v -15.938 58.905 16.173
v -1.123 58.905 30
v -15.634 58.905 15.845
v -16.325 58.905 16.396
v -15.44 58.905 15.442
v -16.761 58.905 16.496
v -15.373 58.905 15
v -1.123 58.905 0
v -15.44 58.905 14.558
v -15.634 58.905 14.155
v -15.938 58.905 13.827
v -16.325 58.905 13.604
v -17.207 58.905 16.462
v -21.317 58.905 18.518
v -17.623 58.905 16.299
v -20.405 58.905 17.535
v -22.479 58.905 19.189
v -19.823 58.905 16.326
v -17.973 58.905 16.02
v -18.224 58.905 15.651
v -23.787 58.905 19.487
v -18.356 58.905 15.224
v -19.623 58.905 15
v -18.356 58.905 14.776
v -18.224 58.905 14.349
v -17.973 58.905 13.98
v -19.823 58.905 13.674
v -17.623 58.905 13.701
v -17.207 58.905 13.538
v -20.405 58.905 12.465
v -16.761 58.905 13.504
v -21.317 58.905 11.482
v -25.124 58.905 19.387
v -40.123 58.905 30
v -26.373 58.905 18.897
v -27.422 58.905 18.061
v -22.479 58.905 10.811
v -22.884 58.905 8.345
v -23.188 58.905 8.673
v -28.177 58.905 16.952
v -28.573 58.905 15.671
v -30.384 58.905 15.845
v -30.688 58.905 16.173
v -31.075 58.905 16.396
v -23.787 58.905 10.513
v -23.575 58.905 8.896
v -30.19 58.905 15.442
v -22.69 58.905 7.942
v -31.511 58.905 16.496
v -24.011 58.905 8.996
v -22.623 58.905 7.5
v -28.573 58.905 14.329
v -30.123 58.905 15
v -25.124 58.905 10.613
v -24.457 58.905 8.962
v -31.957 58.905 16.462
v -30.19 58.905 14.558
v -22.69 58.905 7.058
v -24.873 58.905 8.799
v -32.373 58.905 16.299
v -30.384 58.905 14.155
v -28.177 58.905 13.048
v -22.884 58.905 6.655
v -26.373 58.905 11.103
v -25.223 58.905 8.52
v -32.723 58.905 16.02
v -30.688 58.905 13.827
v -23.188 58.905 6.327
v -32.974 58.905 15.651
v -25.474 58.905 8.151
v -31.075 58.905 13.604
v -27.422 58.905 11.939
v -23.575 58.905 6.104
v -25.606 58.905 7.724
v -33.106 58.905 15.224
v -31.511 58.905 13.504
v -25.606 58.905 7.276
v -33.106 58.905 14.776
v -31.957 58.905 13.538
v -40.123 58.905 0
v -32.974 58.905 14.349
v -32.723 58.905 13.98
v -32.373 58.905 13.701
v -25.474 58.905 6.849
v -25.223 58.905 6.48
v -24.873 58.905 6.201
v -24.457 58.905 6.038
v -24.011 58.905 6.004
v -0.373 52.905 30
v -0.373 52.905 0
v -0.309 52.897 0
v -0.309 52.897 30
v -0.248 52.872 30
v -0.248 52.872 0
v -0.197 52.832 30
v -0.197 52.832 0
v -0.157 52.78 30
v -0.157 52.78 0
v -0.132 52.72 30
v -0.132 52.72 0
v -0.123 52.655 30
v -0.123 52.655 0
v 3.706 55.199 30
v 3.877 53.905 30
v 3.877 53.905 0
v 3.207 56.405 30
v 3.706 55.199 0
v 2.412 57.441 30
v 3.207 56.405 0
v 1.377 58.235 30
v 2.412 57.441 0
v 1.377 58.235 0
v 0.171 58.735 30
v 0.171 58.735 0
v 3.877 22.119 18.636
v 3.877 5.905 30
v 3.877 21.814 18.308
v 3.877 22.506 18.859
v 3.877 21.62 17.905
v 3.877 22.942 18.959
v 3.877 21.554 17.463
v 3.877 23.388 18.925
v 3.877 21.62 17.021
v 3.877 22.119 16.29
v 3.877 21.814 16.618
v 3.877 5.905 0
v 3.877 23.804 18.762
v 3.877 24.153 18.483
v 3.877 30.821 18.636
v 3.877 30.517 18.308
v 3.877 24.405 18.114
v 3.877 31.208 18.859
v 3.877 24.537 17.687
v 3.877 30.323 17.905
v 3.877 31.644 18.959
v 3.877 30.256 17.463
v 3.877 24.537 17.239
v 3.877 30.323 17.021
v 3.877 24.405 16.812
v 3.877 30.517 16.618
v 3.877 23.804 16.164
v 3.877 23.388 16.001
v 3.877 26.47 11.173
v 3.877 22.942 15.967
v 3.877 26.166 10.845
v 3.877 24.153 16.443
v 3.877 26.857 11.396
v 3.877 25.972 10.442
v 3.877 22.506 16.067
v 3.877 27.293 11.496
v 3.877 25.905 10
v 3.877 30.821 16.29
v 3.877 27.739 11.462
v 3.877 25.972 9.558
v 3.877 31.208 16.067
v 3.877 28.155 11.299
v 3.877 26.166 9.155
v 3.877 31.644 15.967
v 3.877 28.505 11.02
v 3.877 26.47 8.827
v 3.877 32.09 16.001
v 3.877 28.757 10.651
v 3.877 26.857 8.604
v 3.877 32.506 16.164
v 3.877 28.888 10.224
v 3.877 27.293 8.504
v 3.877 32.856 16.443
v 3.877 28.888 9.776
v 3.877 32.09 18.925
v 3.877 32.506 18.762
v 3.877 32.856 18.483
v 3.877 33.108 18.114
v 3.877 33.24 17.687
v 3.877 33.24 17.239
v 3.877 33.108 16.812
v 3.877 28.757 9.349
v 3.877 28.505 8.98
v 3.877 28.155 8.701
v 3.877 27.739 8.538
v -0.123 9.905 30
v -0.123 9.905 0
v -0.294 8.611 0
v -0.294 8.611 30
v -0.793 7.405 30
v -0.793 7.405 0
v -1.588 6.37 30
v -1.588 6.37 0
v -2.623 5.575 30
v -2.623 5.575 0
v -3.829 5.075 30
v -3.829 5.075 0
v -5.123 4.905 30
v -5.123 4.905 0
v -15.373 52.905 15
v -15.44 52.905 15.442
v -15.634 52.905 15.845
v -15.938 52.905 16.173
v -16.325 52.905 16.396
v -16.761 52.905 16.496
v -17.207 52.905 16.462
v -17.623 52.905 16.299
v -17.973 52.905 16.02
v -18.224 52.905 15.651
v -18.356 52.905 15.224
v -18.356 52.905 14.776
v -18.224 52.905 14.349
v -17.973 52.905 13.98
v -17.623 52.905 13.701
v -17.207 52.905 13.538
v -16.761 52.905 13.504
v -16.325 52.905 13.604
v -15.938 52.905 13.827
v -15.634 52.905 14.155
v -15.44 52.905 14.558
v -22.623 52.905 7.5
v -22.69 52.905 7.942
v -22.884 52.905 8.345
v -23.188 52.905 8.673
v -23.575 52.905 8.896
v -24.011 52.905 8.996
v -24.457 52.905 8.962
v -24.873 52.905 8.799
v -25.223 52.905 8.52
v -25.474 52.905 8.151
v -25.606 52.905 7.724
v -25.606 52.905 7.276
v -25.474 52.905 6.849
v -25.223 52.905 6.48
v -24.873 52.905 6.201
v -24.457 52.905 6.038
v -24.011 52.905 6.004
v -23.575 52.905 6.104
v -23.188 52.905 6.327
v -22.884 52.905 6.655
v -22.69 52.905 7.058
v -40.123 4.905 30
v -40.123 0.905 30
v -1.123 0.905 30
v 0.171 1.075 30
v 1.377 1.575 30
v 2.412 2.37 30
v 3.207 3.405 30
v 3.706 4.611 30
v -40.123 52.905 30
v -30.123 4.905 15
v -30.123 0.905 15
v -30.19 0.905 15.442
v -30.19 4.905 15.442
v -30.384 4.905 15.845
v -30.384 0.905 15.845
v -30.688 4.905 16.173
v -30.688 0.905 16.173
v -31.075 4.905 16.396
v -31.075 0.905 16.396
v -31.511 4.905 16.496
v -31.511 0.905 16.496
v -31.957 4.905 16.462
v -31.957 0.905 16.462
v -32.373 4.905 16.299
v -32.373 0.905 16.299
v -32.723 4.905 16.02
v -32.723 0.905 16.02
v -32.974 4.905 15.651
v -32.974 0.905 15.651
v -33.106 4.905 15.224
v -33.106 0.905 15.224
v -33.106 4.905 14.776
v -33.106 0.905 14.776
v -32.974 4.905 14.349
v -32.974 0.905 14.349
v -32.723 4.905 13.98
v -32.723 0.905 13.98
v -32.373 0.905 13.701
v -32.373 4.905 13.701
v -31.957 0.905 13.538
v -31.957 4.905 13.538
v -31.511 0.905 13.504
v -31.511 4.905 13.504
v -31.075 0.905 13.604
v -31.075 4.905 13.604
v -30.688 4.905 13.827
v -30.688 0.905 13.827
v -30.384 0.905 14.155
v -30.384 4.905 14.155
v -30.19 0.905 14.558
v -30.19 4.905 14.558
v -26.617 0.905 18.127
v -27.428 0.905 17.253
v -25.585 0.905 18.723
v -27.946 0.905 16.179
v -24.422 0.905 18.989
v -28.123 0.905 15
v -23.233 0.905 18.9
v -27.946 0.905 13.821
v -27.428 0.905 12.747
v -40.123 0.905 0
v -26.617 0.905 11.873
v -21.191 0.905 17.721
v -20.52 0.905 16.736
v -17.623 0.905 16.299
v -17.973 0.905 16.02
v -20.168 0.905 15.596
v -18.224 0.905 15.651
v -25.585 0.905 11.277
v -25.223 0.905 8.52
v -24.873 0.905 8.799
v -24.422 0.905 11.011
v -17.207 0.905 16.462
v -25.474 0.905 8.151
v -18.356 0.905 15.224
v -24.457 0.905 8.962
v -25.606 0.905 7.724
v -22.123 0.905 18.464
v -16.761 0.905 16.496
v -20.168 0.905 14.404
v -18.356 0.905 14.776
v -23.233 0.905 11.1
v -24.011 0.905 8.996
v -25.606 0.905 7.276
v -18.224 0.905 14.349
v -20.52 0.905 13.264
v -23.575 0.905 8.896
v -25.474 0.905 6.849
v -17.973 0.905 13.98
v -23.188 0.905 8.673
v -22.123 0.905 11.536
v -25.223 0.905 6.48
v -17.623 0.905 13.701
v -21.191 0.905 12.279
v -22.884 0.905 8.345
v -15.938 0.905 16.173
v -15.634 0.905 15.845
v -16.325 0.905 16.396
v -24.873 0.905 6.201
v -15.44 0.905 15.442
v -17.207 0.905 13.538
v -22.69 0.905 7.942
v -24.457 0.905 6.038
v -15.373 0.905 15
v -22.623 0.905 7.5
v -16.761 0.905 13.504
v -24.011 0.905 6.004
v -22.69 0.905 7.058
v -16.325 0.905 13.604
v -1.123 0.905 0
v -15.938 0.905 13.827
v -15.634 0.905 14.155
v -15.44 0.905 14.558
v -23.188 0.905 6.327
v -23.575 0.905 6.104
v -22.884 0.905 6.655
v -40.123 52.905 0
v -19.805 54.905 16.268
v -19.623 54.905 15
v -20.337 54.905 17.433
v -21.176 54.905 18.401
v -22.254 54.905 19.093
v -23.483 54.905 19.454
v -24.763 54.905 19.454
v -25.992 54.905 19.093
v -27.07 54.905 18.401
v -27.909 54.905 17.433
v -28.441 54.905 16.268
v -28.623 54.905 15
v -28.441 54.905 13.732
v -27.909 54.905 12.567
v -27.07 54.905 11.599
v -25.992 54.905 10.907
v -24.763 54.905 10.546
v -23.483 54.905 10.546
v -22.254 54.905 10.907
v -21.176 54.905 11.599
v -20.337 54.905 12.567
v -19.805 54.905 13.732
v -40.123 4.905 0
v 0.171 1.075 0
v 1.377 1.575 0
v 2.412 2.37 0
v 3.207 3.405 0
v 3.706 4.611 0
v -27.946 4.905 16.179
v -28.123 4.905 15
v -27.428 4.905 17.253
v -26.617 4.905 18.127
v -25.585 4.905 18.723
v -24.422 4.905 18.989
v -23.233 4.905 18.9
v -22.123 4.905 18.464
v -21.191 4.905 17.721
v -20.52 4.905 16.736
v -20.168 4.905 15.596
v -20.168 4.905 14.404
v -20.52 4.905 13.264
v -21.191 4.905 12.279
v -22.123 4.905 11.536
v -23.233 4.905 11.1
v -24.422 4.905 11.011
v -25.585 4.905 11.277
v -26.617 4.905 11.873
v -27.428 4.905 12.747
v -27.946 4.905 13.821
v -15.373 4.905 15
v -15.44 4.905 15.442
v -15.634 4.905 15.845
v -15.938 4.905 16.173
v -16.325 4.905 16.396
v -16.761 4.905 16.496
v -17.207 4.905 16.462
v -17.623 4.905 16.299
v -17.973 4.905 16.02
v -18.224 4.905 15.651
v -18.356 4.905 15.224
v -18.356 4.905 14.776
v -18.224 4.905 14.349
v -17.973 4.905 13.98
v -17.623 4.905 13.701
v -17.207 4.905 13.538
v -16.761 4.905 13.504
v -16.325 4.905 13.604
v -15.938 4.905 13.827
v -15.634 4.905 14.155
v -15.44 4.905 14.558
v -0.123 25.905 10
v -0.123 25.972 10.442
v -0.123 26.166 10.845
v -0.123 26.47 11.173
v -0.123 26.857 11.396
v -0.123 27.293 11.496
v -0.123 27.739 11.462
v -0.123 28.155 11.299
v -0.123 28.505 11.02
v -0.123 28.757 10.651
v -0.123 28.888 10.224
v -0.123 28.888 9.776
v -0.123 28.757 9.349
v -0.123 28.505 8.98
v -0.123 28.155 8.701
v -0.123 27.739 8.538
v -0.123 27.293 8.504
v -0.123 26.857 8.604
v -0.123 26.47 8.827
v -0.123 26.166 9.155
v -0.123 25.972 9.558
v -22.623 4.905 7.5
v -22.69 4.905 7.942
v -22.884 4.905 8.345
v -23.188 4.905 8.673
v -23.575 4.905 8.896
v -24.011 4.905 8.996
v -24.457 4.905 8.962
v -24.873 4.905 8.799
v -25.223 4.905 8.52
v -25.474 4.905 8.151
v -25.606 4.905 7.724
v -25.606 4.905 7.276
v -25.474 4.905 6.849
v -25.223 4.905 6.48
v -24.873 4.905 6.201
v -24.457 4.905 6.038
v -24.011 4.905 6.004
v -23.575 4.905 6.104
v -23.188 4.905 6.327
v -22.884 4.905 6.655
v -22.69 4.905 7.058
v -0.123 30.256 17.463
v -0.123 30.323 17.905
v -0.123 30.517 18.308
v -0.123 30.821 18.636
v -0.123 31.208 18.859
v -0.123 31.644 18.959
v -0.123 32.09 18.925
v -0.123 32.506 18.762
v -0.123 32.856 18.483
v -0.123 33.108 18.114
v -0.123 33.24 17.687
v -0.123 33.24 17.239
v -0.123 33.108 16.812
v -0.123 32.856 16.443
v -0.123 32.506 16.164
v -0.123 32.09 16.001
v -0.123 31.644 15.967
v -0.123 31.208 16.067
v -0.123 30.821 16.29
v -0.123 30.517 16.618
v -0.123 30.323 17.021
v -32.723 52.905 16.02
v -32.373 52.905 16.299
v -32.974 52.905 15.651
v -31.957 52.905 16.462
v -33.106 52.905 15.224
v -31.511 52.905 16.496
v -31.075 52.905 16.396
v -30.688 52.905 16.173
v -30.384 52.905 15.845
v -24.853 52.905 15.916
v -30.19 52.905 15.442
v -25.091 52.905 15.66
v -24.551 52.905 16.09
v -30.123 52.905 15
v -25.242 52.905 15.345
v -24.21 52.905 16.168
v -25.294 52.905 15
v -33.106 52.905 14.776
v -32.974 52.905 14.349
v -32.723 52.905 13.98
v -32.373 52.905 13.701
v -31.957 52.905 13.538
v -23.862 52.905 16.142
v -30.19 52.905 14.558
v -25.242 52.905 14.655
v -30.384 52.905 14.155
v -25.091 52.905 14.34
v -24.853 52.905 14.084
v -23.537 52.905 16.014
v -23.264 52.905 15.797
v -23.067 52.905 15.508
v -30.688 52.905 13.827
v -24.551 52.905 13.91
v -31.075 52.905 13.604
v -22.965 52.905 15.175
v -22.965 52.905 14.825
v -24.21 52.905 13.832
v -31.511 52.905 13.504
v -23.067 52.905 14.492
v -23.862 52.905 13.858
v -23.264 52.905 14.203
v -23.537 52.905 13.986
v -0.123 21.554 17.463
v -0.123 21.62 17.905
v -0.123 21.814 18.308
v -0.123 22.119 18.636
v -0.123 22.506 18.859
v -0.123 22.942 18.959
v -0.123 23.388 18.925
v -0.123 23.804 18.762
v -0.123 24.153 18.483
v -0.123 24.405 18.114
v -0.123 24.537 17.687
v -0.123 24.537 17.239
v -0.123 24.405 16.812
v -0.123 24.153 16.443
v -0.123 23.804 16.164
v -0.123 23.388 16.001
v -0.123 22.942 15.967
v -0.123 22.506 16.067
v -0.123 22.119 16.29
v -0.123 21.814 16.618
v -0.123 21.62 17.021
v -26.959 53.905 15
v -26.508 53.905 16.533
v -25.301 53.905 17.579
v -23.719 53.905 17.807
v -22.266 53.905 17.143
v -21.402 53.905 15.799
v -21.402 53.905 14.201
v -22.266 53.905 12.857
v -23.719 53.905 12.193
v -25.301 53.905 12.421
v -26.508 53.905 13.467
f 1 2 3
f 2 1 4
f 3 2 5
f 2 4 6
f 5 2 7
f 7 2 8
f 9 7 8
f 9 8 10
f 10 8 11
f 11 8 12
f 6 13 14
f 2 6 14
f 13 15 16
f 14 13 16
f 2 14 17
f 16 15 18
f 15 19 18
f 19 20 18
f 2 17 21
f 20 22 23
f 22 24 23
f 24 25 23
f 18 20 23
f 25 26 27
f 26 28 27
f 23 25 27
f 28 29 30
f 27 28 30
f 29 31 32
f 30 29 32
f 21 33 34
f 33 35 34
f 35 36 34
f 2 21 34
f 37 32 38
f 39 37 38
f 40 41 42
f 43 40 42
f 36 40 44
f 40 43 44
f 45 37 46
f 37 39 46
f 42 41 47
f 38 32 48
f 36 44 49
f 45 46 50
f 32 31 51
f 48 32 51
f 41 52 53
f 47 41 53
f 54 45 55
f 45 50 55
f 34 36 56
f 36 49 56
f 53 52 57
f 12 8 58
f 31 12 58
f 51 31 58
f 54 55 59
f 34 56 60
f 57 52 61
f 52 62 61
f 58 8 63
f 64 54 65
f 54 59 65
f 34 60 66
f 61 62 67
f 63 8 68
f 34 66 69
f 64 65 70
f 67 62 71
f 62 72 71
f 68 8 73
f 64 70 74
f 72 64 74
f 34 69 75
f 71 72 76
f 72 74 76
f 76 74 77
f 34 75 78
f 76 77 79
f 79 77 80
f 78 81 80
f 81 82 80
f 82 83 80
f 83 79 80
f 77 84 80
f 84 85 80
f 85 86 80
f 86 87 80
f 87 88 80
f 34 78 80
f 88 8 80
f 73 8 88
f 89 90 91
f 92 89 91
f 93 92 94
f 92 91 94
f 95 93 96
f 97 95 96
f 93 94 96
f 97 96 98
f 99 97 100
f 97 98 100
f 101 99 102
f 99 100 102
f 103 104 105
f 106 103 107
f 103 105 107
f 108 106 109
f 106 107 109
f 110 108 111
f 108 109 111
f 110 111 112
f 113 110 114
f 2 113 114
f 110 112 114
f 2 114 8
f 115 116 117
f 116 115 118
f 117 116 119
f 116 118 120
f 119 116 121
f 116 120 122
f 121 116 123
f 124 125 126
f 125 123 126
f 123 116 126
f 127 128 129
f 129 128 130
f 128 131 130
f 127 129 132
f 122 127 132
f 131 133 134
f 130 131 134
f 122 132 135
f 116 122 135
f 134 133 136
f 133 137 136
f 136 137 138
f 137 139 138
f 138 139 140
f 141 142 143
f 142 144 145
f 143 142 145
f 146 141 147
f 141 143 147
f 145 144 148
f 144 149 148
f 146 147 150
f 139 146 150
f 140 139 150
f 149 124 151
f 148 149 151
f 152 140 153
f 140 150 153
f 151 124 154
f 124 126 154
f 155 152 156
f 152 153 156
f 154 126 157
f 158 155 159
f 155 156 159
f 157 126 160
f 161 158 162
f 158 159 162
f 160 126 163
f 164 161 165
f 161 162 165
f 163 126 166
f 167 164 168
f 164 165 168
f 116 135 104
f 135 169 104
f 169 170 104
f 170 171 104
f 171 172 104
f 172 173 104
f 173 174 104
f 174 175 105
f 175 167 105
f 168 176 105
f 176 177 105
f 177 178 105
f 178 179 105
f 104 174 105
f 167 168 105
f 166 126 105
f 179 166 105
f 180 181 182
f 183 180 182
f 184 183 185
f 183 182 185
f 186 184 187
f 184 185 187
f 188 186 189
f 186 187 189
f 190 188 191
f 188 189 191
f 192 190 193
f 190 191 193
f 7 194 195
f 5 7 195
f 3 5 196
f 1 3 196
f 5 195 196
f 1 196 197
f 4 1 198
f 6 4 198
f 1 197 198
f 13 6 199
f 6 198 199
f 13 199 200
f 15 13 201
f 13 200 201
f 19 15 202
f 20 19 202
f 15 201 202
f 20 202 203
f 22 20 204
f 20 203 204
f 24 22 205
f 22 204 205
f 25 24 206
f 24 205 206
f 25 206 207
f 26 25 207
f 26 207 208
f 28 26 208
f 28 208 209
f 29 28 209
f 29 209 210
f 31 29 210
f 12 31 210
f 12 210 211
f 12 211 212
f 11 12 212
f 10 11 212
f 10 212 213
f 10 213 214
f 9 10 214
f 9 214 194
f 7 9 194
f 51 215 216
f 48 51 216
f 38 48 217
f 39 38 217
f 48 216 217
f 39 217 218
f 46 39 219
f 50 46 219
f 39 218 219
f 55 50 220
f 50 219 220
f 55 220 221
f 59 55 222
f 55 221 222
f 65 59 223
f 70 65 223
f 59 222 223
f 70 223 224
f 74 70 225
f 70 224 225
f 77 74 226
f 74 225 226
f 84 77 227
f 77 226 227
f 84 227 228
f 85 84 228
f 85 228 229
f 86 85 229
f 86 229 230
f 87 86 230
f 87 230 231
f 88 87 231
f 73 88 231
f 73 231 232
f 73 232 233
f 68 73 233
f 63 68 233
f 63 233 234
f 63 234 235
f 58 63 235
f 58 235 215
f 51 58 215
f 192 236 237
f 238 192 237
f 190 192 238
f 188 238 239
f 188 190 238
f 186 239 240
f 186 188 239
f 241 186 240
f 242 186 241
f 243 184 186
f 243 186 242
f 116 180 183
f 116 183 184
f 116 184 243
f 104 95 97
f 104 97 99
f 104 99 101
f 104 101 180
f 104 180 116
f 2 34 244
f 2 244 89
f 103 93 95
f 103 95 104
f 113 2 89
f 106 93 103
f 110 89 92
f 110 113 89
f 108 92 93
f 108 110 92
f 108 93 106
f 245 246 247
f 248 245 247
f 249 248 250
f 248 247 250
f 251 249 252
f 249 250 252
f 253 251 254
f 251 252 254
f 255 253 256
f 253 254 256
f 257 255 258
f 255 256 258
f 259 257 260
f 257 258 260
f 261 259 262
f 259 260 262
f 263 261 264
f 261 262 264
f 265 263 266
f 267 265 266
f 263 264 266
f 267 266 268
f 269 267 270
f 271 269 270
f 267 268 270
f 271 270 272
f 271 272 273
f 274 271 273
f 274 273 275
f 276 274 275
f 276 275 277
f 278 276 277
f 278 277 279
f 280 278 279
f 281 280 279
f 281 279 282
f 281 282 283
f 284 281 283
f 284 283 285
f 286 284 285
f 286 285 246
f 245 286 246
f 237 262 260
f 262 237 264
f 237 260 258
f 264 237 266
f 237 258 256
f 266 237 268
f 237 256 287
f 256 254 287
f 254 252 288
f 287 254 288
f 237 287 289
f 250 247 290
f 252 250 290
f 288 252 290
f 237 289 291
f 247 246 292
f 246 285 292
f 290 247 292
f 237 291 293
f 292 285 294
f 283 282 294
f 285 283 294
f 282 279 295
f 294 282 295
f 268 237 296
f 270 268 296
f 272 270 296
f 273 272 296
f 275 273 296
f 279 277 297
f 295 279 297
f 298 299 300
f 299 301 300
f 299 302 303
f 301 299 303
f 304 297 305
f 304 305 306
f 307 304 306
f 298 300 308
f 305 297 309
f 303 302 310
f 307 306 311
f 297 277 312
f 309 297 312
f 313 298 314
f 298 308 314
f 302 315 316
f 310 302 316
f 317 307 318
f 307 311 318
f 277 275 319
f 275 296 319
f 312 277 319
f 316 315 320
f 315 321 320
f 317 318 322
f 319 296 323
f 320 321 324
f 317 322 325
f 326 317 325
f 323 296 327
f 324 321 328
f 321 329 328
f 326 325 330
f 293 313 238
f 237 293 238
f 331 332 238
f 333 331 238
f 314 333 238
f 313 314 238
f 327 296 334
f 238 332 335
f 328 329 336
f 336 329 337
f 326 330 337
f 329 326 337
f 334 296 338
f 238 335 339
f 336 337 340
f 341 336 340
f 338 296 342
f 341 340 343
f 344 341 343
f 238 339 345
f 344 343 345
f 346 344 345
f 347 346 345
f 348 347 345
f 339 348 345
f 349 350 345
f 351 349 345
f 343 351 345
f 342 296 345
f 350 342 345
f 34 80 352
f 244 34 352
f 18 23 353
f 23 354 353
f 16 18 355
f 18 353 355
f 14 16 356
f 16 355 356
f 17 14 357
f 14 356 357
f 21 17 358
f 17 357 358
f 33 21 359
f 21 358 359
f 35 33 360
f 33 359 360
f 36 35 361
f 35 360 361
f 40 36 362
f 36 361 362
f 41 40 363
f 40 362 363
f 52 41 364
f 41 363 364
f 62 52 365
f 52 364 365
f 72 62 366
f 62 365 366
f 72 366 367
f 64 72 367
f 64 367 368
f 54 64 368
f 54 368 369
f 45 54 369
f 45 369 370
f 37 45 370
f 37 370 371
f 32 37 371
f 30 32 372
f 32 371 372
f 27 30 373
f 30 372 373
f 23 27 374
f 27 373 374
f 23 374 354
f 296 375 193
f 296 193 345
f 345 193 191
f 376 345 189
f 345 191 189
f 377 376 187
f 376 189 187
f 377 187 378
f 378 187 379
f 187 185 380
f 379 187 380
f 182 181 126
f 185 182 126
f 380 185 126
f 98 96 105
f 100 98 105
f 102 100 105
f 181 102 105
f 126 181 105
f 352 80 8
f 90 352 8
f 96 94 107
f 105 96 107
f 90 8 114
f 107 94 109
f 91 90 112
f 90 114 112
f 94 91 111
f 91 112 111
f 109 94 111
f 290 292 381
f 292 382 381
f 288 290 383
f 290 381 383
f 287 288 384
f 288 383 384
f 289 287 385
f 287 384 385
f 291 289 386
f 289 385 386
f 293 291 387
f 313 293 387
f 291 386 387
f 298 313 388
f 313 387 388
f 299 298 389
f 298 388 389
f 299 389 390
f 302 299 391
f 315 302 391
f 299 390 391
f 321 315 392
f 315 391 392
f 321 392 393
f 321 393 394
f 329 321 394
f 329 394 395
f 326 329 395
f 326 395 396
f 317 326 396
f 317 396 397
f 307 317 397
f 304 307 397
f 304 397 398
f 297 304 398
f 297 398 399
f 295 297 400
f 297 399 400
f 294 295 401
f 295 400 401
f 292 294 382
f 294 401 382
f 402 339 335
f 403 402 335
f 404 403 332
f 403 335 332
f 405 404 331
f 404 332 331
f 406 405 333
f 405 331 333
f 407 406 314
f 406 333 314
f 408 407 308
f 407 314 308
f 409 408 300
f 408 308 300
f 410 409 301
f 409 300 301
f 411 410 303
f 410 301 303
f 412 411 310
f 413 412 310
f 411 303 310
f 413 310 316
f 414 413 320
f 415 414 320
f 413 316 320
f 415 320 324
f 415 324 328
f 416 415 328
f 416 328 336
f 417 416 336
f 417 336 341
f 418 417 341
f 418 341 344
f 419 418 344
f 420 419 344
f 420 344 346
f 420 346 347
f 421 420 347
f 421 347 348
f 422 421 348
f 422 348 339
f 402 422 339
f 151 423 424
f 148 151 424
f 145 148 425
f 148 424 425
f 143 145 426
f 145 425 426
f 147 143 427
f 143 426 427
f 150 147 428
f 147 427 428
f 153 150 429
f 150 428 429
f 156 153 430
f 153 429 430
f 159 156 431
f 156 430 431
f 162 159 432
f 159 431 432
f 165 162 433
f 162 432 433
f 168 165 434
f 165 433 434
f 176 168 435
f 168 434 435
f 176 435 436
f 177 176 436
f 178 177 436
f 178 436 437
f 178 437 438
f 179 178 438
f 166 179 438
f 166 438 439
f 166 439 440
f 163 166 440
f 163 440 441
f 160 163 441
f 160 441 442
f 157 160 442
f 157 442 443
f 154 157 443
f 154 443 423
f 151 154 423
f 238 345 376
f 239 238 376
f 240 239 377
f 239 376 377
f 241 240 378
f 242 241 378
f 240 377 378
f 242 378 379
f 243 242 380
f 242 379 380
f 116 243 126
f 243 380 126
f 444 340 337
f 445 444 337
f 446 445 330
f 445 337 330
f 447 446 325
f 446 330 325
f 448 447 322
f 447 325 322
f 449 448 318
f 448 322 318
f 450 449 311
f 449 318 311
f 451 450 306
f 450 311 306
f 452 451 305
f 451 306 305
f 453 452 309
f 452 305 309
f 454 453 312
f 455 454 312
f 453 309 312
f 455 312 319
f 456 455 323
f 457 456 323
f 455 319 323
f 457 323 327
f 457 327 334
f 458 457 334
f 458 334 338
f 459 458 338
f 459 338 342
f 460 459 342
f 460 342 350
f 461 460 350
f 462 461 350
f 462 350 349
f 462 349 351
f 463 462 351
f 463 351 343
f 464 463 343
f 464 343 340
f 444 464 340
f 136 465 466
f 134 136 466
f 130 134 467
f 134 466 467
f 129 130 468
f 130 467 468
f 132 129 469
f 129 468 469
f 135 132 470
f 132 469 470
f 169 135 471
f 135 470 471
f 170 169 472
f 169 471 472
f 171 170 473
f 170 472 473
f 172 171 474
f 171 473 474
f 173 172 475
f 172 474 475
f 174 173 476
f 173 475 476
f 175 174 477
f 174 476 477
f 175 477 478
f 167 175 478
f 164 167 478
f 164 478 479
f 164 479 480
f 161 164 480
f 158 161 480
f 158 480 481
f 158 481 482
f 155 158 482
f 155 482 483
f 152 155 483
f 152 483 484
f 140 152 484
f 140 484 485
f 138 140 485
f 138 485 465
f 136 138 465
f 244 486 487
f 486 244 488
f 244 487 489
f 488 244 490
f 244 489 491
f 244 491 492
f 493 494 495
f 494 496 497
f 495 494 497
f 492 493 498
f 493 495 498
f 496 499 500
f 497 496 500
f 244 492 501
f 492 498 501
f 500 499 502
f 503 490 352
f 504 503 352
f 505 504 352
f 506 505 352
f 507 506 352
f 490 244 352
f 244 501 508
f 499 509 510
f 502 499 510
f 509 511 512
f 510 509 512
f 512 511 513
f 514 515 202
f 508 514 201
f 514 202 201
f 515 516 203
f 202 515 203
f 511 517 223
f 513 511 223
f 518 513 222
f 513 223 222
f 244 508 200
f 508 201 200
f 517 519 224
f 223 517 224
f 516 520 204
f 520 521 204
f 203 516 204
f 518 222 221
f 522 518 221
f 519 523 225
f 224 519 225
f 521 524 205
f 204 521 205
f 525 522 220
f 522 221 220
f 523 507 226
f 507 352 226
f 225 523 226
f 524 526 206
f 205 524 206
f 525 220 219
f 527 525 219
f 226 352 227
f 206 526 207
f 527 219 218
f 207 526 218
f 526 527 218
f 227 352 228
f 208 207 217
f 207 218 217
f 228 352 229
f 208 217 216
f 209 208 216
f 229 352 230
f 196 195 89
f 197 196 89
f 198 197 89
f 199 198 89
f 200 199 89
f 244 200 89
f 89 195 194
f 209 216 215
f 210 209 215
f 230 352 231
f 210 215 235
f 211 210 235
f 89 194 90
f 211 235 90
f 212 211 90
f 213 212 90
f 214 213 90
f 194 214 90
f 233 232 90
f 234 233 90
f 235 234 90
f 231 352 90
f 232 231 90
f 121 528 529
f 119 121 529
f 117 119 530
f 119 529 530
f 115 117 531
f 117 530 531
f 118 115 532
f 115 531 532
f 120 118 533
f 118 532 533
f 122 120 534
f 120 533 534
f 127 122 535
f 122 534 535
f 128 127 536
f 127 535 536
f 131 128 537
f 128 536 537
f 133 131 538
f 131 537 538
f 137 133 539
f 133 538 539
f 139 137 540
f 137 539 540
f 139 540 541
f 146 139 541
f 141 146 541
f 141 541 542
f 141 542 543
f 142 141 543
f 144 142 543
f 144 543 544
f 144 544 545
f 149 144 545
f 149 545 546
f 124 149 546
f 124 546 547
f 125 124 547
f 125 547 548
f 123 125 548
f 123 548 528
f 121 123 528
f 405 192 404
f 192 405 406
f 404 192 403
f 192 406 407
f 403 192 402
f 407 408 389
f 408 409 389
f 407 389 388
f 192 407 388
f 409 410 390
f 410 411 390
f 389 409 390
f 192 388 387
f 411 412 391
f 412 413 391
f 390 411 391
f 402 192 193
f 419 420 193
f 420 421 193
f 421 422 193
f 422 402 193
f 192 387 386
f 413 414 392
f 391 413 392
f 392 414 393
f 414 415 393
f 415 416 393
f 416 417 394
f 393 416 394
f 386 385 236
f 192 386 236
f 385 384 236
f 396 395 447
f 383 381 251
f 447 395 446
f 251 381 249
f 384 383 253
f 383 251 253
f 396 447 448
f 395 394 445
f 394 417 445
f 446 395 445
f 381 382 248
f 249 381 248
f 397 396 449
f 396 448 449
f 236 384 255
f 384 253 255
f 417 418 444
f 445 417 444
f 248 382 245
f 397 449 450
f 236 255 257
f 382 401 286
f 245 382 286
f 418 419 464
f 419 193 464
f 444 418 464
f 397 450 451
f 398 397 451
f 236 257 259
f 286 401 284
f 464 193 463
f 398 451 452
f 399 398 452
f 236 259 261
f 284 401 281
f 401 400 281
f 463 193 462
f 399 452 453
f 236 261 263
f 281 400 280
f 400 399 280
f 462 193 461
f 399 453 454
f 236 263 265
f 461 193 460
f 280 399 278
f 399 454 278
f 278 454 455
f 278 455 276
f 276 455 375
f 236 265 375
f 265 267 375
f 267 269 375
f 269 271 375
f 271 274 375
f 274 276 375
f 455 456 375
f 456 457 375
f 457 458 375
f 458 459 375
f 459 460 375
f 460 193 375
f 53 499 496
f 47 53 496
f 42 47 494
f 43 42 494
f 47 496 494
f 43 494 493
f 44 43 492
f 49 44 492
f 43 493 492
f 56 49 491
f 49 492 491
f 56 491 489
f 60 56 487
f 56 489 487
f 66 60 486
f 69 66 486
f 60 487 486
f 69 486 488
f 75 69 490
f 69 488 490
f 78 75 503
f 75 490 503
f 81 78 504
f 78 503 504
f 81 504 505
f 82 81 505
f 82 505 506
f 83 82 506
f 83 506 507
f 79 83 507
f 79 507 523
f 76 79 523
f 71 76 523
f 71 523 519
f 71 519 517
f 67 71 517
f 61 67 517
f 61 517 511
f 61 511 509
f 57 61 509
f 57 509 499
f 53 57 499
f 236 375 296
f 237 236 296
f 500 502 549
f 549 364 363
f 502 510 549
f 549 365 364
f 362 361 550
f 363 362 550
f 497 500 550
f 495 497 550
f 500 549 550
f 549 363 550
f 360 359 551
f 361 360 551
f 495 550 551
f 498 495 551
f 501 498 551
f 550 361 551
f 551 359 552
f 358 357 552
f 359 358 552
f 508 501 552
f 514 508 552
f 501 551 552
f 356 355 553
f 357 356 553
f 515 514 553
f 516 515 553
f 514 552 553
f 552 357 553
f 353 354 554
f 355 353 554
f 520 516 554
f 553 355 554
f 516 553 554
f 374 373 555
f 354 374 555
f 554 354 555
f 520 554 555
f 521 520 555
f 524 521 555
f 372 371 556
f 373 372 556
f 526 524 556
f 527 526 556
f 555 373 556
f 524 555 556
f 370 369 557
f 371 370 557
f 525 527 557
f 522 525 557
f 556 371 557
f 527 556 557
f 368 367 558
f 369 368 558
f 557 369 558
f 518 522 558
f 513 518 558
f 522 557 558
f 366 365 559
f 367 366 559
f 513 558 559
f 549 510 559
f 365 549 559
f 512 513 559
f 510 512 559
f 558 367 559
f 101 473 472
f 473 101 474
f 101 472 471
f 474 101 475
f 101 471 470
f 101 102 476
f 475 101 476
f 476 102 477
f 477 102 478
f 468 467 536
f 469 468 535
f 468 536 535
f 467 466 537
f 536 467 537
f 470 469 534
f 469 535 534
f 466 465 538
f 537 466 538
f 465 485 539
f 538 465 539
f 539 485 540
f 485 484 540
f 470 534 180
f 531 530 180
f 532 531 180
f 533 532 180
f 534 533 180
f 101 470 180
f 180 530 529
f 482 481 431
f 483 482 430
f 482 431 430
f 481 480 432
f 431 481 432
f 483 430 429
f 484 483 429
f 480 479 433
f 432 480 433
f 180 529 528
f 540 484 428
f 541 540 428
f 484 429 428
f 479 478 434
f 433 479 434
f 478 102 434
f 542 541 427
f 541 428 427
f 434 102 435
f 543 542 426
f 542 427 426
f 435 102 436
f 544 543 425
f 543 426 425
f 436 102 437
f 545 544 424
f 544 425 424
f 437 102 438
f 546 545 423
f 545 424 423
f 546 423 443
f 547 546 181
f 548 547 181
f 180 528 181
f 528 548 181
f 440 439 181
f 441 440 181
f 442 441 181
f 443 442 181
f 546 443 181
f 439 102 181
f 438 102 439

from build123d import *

# Parameters (mm, degrees)
F1_DEPTH = 30
F3_D     = 3
F5_D     = 9
F5_DEPTH = 4
F5_TIP   = 2.7038727856
F7_D     = 3
F9_D     = 8
F9_DEPTH = 4
F9_TIP   = 2.4034424761


with BuildPart() as f1:
    # F0 (on Top) → F1 (new body)
    with BuildSketch(Plane.XY):
        with BuildLine():
            ThreePointArc((-0.3734174669, 52.9050653557), (-0.1966407716, 52.831842051), (-0.1234174669, 52.6550653557))
            Line((-0.1234174669, 52.6550653557), (-0.1234174669, 9.9050653557))
            ThreePointArc((-0.1234174669, 9.9050653557), (-1.5878835609, 6.3695314498), (-5.1234174669, 4.9050653557))
            Line((-5.1234174669, 4.9050653557), (-40.1234174669, 4.9050653557))
            Line((-40.1234174669, 4.9050653557), (-40.1234174669, 0.9050653557))
            Line((-40.1234174669, 0.9050653557), (-1.1234174669, 0.9050653557))
            ThreePointArc((-1.1234174669, 0.9050653557), (2.4121164391, 2.3695314498), (3.8765825331, 5.9050653557))
            Line((3.8765825331, 5.9050653557), (3.8765825331, 53.9050653557))
            ThreePointArc((3.8765825331, 53.9050653557), (2.4121164391, 57.4405992616), (-1.1234174669, 58.9050653557))
            Line((-1.1234174669, 58.9050653557), (-40.1234174669, 58.9050653557))
            Line((-40.1234174669, 58.9050653557), (-40.1234174669, 52.9050653557))
            Line((-40.1234174669, 52.9050653557), (-0.3734174669, 52.9050653557))
        make_face()
    extrude(amount=F1_DEPTH)

    # F3 (through all)
    with Locations(Plane.YZ.offset(3.8765825331)):
        with Locations((23.0537810803, 17.4629910993), (27.4050653557, 10), (31.7563496311, 17.4629910993)):
            Hole(F3_D / 2)

    # F5
    with Locations(Plane(origin=(0, 58.9050653557, 0), x_dir=(-1, 0, 0), z_dir=(0, 1, 0))):
        with Locations((24.1229310632, 15)):
            Hole(F5_D / 2, depth=F5_DEPTH)
            with Locations((0, 0, -(F5_DEPTH + F5_TIP / 2))):  # 118° drill point
                Cone(0, F5_D / 2, F5_TIP, mode=Mode.SUBTRACT)

    # F7 (through all)
    with Locations(Plane(origin=(0, 58.9050653557, 0), x_dir=(-1, 0, 0), z_dir=(0, 1, 0))):
        with Locations((31.6229310632, 15), (24.1229310632, 7.5), (16.8729310632, 15)):
            Hole(F7_D / 2)

    # F9
    with Locations(Plane.XZ.offset(-0.9050653557)):
        with Locations((-24.1234174669, 15)):
            Hole(F9_D / 2, depth=F9_DEPTH)
            with Locations((0, 0, -(F9_DEPTH + F9_TIP / 2))):  # 118° drill point
                Cone(0, F9_D / 2, F9_TIP, mode=Mode.SUBTRACT)


solid = f1.part
